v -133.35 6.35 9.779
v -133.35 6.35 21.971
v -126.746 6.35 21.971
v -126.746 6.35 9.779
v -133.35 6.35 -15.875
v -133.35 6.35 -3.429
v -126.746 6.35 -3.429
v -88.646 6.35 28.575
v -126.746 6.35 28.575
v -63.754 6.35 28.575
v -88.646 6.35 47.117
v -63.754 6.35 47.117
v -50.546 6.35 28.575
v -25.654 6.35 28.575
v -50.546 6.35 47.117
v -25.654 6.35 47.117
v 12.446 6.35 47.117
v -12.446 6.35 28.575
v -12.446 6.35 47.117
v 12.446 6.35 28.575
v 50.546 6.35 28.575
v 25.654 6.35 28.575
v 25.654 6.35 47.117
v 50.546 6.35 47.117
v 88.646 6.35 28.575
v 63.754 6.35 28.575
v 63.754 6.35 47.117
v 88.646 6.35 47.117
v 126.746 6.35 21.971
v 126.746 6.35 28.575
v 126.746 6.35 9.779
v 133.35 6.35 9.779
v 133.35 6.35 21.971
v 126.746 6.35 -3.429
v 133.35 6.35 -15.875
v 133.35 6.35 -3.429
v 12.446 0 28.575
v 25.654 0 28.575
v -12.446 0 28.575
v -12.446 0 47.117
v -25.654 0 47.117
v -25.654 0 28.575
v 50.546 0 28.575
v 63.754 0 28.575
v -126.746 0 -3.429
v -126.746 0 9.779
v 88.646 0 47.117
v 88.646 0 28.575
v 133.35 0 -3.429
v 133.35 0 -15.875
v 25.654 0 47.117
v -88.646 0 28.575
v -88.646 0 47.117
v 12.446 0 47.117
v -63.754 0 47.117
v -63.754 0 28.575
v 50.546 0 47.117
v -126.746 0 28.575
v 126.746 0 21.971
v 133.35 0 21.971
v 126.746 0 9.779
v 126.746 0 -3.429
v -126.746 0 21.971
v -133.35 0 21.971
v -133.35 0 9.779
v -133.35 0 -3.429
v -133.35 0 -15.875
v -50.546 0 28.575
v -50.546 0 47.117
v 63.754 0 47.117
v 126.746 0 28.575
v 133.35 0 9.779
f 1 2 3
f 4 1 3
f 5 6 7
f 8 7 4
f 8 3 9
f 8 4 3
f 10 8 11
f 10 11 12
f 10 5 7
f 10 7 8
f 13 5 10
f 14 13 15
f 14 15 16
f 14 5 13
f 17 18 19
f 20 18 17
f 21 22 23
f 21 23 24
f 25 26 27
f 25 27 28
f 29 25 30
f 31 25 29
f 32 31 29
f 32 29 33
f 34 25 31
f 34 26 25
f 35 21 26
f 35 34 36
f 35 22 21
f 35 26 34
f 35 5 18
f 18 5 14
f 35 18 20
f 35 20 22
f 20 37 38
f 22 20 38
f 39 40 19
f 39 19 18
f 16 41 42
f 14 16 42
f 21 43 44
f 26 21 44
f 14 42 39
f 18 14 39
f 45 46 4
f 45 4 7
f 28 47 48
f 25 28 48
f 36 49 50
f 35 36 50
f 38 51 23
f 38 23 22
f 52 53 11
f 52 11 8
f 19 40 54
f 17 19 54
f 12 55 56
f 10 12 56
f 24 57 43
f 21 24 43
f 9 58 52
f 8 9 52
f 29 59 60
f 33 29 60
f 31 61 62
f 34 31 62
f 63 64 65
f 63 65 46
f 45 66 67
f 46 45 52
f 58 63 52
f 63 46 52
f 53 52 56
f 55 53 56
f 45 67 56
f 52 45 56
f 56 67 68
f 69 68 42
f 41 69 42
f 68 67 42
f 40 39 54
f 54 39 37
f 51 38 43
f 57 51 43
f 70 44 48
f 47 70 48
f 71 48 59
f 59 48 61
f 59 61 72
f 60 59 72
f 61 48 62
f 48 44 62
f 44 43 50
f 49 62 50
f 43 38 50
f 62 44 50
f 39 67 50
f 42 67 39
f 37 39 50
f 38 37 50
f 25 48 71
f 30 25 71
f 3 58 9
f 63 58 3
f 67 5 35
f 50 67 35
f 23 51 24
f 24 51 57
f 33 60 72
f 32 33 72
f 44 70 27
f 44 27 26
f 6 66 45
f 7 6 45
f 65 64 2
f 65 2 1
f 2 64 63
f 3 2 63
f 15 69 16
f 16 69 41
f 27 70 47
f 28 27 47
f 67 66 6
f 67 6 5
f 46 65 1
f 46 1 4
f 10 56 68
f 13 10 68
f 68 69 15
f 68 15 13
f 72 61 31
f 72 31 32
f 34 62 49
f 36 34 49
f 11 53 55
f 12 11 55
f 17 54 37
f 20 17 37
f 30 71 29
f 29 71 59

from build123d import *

# Parameters (mm, degrees)
SKETCH1_W           = 266.7
SKETCH1_H           = 57.15
BOSS_EXTRUDE1_DEPTH = 6.35
SKETCH3_W           = 24.892
SKETCH3_H           = 18.542
BOSS_EXTRUDE2_DEPTH = 6.35
SKETCH4_W           = 13.208
SKETCH4_H           = 13.208
CUT_EXTRUDE2_DEPTH  = 142.5717369
SKETCH5_W           = 295.464136086
SKETCH5_H           = 12.7
CUT_EXTRUDE3_DEPTH  = 142.5717369
SKETCH6_W           = 266.7
SKETCH6_H           = 12.446
BOSS_EXTRUDE3_DEPTH = 6.35


with BuildPart() as part:
    # Sketch1 → Boss-Extrude1 (new body)
    with BuildSketch(Plane(origin=(0, 0, 0), x_dir=(1, 0, 0), z_dir=(0, 1, 0))):
        Rectangle(SKETCH1_W, SKETCH1_H)
    extrude(amount=BOSS_EXTRUDE1_DEPTH)

    # Sketch3 → Boss-Extrude2 (add)
    with BuildSketch(Plane(origin=(0, 0, 0), x_dir=(1, 0, 0), z_dir=(0, 1, 0))):
        with Locations((-76.2, -37.846)):
            Rectangle(SKETCH3_W, SKETCH3_H)
        with Locations((-38.1, -37.846)):
            Rectangle(SKETCH3_W, SKETCH3_H)
        with Locations((0, -37.846)):
            Rectangle(SKETCH3_W, SKETCH3_H)
        with Locations((38.1, -37.846)):
            Rectangle(SKETCH3_W, SKETCH3_H)
        with Locations((76.2, -37.846)):
            Rectangle(SKETCH3_W, SKETCH3_H)
    extrude(amount=BOSS_EXTRUDE2_DEPTH)

    # Sketch4 → Cut-Extrude2 (cut, through all)
    with BuildSketch(Plane(origin=(0, 0, 0), x_dir=(1, 0, 0), z_dir=(0, 1, 0))):
        with Locations((-133.35, 22.225)):
            Rectangle(SKETCH4_W, SKETCH4_H)
        with Locations((133.35, 22.225)):
            Rectangle(SKETCH4_W, SKETCH4_H)
        with Locations((-133.35, -3.175)):
            Rectangle(SKETCH4_W, SKETCH4_H)
        with Locations((-133.35, -28.575)):
            Rectangle(SKETCH4_W, SKETCH4_H)
        with Locations((133.35, -3.175)):
            Rectangle(SKETCH4_W, SKETCH4_H)
        with Locations((133.35, -28.575)):
            Rectangle(SKETCH4_W, SKETCH4_H)
    extrude(amount=CUT_EXTRUDE2_DEPTH, mode=Mode.SUBTRACT)

    # Sketch5 → Cut-Extrude3 (cut, through all)
    with BuildSketch(Plane(origin=(0, 6.35, 0), x_dir=(1, 0, 0), z_dir=(0, 1, 0))):
        with Locations((7.963252738, 22.225)):
            Rectangle(SKETCH5_W, SKETCH5_H)
    extrude(amount=-CUT_EXTRUDE3_DEPTH, mode=Mode.SUBTRACT)

    # Sketch6 → Boss-Extrude3 (add)
    with BuildSketch(Plane(origin=(0, 6.35, 0), x_dir=(1, 0, 0), z_dir=(0, 1, 0))):
        with Locations((0, 9.652)):
            Rectangle(SKETCH6_W, SKETCH6_H)
    extrude(amount=-BOSS_EXTRUDE3_DEPTH)


solid = part.part
